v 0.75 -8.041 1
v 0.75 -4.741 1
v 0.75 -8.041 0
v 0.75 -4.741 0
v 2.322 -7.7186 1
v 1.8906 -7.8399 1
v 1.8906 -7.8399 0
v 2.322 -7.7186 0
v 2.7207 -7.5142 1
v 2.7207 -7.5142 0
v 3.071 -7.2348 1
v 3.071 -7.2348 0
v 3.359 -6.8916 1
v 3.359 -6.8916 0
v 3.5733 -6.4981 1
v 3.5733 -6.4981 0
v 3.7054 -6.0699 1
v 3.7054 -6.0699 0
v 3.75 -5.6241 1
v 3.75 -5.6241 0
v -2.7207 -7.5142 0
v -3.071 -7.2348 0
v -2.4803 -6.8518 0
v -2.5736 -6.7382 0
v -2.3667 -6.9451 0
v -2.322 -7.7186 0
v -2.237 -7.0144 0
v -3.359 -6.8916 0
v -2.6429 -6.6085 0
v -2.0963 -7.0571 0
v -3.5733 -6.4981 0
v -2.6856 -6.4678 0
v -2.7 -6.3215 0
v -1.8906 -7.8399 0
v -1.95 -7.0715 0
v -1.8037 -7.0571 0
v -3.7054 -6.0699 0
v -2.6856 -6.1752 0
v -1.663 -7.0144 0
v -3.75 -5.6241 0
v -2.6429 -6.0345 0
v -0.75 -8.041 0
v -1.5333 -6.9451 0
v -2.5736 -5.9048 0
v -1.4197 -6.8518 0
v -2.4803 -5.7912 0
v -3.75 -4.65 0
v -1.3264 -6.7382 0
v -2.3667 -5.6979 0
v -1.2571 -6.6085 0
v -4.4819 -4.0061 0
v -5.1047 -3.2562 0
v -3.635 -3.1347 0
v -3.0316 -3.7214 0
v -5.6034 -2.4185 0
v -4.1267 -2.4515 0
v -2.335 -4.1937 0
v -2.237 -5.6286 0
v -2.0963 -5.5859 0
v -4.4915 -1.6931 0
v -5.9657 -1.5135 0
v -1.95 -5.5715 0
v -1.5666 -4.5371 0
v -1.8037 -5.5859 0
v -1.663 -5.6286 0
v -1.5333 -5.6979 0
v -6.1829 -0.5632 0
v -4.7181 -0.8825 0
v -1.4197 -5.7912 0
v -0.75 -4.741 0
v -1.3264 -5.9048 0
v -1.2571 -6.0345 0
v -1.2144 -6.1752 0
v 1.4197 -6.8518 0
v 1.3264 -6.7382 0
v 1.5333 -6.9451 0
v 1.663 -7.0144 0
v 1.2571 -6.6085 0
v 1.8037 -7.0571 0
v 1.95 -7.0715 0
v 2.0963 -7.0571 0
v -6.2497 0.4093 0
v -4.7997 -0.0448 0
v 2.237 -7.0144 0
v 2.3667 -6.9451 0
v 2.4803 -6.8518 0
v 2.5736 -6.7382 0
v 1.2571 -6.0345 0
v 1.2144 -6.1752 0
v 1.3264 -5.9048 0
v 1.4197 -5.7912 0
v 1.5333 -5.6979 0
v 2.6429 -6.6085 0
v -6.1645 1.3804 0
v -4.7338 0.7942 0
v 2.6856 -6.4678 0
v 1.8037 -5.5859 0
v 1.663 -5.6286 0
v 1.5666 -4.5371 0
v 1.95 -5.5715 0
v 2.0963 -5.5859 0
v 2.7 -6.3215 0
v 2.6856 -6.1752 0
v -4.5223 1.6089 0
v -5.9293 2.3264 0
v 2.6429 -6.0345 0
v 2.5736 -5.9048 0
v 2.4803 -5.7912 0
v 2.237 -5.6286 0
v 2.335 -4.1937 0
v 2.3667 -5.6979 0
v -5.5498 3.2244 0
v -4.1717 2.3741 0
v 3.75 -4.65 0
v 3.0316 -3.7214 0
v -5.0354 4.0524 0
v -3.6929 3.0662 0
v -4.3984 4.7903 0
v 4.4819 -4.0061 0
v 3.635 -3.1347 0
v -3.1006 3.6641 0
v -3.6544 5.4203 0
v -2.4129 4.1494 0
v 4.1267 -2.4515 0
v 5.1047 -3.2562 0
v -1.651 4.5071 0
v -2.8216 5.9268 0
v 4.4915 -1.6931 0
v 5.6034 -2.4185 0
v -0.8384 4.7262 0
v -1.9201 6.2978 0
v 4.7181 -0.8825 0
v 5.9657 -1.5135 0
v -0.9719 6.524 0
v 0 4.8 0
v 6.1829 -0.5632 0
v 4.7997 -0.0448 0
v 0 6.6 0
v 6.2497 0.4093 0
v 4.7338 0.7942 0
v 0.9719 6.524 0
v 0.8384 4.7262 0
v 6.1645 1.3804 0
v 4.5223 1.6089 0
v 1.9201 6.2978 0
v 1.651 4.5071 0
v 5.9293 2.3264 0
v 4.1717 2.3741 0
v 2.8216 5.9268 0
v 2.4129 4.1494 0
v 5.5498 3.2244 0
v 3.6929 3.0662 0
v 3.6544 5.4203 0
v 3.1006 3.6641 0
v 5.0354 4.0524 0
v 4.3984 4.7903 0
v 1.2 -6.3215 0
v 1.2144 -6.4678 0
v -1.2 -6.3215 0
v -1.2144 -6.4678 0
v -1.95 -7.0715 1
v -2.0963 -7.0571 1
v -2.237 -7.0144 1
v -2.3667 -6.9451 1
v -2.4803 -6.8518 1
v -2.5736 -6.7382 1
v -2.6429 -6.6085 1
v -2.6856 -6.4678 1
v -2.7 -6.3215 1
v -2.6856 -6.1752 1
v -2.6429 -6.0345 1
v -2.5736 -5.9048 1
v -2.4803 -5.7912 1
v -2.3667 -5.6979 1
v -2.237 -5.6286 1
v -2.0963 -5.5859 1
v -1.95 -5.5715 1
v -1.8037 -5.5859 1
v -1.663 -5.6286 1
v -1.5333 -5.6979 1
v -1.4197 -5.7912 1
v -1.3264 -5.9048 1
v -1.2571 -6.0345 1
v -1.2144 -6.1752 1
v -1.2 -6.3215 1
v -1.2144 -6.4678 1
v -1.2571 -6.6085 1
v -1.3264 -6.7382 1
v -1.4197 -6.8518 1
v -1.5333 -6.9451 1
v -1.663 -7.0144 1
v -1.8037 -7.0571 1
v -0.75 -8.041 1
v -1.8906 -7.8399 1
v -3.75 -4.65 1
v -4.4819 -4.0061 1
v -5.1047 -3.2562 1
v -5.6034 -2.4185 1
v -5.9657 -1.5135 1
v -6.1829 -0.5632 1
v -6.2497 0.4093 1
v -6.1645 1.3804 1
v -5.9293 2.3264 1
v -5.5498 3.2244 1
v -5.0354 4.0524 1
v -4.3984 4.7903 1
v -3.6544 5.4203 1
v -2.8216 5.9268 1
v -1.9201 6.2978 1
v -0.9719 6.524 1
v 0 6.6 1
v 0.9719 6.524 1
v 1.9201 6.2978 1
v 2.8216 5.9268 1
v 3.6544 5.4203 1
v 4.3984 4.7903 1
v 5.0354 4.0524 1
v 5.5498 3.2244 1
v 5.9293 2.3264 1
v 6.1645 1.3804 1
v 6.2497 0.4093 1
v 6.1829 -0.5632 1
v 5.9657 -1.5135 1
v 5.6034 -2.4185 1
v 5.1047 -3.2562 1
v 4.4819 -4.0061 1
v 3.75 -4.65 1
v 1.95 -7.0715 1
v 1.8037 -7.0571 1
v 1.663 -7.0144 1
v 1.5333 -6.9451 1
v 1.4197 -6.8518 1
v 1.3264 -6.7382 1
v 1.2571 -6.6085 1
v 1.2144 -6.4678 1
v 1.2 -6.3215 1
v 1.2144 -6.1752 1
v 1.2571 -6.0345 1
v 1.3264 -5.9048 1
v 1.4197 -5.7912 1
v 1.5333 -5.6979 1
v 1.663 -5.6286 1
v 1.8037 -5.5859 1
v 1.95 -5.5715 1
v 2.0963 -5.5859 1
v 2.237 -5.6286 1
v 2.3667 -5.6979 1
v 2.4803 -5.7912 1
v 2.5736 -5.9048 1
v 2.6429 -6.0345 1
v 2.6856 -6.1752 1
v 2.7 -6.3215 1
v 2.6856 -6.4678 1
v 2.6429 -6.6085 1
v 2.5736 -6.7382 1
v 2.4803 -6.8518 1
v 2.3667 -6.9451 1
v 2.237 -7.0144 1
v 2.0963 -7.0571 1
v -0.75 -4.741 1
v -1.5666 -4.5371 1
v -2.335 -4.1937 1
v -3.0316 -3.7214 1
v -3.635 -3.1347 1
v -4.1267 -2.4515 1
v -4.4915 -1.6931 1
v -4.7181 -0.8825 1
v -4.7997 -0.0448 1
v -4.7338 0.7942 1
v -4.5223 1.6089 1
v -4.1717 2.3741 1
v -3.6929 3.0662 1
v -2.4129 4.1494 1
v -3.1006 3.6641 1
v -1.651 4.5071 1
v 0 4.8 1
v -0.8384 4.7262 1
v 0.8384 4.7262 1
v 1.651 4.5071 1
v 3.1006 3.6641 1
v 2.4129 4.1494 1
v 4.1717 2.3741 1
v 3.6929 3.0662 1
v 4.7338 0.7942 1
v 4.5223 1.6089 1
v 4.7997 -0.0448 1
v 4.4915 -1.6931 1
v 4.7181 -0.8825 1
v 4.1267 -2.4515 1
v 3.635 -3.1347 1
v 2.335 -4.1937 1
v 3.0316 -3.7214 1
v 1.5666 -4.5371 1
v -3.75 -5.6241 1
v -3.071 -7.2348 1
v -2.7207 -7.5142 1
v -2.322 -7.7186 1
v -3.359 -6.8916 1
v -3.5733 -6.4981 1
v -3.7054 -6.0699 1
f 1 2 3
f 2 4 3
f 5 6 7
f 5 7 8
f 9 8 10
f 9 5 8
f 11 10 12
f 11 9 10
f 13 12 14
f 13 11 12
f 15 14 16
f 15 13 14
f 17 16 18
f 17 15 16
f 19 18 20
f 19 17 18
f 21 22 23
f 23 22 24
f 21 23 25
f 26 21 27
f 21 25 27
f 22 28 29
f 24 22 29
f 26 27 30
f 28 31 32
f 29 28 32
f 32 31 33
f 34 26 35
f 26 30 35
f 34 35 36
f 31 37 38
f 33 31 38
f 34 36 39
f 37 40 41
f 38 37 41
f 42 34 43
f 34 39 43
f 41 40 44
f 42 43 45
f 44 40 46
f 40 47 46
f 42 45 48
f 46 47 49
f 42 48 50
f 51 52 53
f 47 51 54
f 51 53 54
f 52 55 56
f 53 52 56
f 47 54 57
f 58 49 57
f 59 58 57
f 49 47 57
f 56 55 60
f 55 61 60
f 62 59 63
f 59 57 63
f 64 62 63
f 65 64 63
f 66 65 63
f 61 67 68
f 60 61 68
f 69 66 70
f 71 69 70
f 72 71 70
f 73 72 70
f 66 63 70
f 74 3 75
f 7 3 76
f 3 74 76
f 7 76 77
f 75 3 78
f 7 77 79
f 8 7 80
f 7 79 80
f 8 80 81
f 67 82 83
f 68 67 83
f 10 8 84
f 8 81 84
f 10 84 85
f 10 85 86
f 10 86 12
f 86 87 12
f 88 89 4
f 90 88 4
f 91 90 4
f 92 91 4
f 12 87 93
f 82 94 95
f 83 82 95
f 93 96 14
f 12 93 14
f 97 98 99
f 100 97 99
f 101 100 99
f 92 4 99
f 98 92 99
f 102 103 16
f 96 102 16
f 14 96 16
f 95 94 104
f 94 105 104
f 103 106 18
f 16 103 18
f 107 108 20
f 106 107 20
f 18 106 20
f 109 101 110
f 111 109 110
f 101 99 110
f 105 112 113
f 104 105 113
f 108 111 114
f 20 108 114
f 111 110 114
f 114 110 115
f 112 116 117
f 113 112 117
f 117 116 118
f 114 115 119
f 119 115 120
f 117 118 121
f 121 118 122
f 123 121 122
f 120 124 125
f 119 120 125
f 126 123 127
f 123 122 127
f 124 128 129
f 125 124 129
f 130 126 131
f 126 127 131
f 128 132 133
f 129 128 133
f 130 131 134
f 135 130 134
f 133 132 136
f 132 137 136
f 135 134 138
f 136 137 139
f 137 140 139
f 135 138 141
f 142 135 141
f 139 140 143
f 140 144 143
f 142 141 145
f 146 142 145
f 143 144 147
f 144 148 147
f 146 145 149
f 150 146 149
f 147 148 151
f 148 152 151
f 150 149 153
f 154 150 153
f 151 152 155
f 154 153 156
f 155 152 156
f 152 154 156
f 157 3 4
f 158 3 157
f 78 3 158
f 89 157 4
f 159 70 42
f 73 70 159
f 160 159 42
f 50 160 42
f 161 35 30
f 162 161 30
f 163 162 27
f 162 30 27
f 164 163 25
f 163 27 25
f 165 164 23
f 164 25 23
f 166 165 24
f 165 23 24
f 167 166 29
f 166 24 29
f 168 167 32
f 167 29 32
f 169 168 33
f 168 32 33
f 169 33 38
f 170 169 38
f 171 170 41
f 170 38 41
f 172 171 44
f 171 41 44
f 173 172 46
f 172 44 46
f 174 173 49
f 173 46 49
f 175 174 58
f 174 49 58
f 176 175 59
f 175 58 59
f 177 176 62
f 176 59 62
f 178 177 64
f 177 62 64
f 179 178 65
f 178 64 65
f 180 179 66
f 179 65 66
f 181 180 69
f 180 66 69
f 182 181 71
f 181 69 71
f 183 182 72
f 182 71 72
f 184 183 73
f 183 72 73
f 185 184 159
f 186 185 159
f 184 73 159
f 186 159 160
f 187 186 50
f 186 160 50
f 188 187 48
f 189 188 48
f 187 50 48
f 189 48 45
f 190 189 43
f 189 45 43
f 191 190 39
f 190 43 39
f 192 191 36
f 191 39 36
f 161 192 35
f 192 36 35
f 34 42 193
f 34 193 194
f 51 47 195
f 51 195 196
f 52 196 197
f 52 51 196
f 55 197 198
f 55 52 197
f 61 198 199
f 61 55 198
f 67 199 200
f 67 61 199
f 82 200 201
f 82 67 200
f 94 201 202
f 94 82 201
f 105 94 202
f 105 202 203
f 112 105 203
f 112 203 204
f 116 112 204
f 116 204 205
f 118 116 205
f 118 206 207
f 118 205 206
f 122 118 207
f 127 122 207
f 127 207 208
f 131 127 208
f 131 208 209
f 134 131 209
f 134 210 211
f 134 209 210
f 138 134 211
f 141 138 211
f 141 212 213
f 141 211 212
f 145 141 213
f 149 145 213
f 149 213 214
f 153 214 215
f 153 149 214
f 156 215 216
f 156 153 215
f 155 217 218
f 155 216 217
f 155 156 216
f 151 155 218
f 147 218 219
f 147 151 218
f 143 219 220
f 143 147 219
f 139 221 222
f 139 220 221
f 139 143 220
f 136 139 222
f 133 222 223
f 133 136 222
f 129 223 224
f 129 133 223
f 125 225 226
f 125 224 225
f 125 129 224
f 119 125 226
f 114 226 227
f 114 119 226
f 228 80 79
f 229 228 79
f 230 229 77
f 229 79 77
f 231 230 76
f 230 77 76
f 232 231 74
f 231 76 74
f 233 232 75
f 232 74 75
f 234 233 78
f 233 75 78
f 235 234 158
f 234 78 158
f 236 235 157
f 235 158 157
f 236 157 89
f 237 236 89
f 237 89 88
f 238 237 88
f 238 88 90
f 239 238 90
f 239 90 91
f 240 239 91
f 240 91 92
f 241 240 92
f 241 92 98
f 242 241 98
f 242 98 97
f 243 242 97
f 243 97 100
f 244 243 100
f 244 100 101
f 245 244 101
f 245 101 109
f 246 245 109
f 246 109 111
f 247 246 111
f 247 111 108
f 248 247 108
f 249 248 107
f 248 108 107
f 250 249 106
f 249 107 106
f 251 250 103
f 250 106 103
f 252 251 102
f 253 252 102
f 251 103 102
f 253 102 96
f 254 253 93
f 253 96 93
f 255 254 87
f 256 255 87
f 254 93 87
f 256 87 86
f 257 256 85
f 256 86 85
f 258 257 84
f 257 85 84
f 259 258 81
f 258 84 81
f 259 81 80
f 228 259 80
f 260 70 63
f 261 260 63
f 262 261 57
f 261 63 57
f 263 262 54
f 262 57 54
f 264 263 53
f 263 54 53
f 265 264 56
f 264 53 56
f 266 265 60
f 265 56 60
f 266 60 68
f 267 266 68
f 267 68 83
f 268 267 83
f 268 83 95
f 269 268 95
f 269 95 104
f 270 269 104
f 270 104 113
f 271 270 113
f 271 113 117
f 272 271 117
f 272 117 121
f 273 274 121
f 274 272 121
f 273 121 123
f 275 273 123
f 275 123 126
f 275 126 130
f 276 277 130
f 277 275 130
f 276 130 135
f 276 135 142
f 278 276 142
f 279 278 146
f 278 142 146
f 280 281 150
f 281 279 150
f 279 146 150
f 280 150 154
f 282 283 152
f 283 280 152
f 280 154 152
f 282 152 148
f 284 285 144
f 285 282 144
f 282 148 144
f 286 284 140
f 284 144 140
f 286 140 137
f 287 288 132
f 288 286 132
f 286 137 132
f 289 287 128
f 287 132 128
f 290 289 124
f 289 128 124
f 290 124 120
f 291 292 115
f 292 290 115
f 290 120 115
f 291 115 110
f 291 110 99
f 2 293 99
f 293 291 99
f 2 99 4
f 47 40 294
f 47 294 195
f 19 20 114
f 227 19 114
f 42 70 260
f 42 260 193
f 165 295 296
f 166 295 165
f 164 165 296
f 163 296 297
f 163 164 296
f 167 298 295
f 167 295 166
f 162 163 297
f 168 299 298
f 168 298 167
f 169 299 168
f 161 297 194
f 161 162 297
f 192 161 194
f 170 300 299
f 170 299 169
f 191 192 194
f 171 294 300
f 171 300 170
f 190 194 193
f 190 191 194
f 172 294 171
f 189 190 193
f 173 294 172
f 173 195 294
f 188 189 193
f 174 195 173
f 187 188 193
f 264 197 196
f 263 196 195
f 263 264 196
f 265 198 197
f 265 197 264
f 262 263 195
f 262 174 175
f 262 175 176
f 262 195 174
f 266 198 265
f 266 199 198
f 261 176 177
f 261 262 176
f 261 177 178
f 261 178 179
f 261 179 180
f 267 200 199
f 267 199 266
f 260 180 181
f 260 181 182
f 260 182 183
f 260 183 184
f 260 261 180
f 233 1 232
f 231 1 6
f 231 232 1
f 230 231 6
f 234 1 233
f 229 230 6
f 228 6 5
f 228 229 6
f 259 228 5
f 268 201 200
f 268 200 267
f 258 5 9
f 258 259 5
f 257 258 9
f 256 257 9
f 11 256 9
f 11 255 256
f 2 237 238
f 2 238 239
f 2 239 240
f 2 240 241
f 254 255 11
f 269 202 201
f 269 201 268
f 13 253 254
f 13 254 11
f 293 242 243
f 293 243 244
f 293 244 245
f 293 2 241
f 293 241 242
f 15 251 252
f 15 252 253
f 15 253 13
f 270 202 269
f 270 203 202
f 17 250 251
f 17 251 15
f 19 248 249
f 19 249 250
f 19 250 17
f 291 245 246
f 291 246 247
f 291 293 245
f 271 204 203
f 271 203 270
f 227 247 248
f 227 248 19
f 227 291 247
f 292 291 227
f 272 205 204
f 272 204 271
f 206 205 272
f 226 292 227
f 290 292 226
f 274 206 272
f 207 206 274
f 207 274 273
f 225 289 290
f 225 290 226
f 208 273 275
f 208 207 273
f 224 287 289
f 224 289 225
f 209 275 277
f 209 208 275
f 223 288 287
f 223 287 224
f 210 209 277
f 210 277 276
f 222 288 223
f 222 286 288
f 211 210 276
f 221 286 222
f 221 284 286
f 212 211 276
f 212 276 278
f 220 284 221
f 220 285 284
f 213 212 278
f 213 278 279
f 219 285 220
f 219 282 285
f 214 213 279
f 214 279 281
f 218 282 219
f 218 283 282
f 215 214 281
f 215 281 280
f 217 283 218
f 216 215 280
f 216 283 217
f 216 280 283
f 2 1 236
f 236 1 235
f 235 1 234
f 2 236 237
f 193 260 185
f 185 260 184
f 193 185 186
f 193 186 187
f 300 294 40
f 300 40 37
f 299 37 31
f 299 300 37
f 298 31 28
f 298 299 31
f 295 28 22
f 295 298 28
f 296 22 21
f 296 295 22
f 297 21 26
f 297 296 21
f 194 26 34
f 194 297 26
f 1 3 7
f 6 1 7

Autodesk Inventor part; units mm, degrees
ref_plane "WorkPlane1" through (0, 0, 0) normal (0, 0, 1) x (1, 0, 0)
ref_plane "Work Plane2" through (0, 0, -1) normal (0, 0, 1) x (1, 0, 0)
ref_plane "WorkPlane2" through (0, 0, 1.5) normal (0, 0, 1) x (1, 0, 0)
sketch "Sketch1" plane through (0, 0, 0) normal (0, 0, 1) x (1, 0, 0)
  point P0 (0, 0)
sketch "Sketch2" plane through (0, 0, 0) normal (0, 0, 1) x (1, 0, 0)
  line L0 (3.75, -7.5121) -> (3.75, -4.65)
  line L1 (0.75, -8.041) -> (3.75, -7.5121)
  line L2 (0.75, -4.741) -> (0.75, -8.041)
  arc A0 (0.75, -4.741) -> (-0.75, -4.741) centre (0, 0) ccw
  line L3 (-0.75, -4.741) -> (-0.75, -8.041)
  line L4 (-0.75, -8.041) -> (-3.75, -7.5121)
  line L5 (-3.75, -7.5121) -> (-3.75, -4.65)
  arc A1 (3.75, -4.65) -> (-3.75, -4.65) centre (0, 0.35) ccw
  dimension "d2" = 4.8
  dimension "d4" = 6.25
  dimension "d6" = 0
  dimension "d8" = 0.75
  dimension "d10" = 0.75
  dimension "d12" = 3.3
  dimension "d14" = 3.3
  dimension "d16" = 80
  dimension "d18" = 80
  dimension "d20" = 3
  dimension "d22" = 3
  dimension "d24" = 0.35
  dimension "d52" = 0
  dimension "d53" = 0
extrude "Extrusion1" add sketch "Sketch2" along normal blind 1
sketch "Sketch3" plane through (0, 0, 1) normal (0, 0, 1) x (1, 0, 0)
  line L0 (-0.75, -4.741) -> (-0.75, -8.041) projected
  line L1 (-0.75, -8.041) -> (-3.75, -7.5121) projected
  point P0 (-1.95, -6.3215)
  dimension "d30" = 1.2
  dimension "d32" = 1.485
hole "Hole1" at (-1.95, -6.3215, 1) direction (0, 0, -1) diameter 1.5 end through all
sketch "Sketch4" plane through (0, 0, 1) normal (0, 0, 1) x (1, 0, 0)
  line L0 (0.75, -8.041) -> (0.75, -4.741) projected
  line L1 (3.75, -7.5121) -> (0.75, -8.041) projected
  point P0 (1.95, -6.3215)
  dimension "d41" = 1.2
  dimension "d43" = 1.485
hole "Hole2" at (1.95, -6.3215, 1) direction (0, 0, -1) diameter 1.5 end through all
fillet "Fillet1" radius 2.25 2 edges at (-3.75, -7.5121, 0.5) (3.75, -7.5121, 0.5)
equation "\"d30\" = 0.8 * Diam5"
equation "\"d32\" = 0.45 * ParA"
equation "\"d33\" = Diam5"
equation "\"d41\" = 0.8 * Diam5"
equation "\"d43\" = 0.45 * ParA"
equation "\"d44\" = Diam5"
equation "\"d51\" = 1.5 * Diam5"
equation "\"d2\" = 0.5 * Diam2"
equation "\"d4\" = 0.166667 * ParA + 0.5 * Diam2 + 0.5 * b"
equation "\"d8\" = 0.5 * Diam5"
equation "\"d10\" = 0.5 * Diam5"
equation "\"d12\" = ParA"
equation "\"d14\" = ParA"
equation "\"d20\" = 2 * Diam5"
equation "\"d22\" = 2 * Diam5"
equation "\"d24\" = -msp_r2 + 0.5 * Diam2 + b"
equation "\"d25\" = ParS"
equation "\"Diam5\" = 1.5"
equation "\"ParA\" = 3.3"
equation "\"ParS\" = 1"
equation "\"Diam2\" = 9.6"
equation "\"msp_r2\" = 0.166667 * ParA + 0.5 * Diam2 + 0.5 * b"
equation "\"TEMPLATE\" = 1.2345"
properties part number "DIN 471 - 10x1" material "Steel, Mild"
